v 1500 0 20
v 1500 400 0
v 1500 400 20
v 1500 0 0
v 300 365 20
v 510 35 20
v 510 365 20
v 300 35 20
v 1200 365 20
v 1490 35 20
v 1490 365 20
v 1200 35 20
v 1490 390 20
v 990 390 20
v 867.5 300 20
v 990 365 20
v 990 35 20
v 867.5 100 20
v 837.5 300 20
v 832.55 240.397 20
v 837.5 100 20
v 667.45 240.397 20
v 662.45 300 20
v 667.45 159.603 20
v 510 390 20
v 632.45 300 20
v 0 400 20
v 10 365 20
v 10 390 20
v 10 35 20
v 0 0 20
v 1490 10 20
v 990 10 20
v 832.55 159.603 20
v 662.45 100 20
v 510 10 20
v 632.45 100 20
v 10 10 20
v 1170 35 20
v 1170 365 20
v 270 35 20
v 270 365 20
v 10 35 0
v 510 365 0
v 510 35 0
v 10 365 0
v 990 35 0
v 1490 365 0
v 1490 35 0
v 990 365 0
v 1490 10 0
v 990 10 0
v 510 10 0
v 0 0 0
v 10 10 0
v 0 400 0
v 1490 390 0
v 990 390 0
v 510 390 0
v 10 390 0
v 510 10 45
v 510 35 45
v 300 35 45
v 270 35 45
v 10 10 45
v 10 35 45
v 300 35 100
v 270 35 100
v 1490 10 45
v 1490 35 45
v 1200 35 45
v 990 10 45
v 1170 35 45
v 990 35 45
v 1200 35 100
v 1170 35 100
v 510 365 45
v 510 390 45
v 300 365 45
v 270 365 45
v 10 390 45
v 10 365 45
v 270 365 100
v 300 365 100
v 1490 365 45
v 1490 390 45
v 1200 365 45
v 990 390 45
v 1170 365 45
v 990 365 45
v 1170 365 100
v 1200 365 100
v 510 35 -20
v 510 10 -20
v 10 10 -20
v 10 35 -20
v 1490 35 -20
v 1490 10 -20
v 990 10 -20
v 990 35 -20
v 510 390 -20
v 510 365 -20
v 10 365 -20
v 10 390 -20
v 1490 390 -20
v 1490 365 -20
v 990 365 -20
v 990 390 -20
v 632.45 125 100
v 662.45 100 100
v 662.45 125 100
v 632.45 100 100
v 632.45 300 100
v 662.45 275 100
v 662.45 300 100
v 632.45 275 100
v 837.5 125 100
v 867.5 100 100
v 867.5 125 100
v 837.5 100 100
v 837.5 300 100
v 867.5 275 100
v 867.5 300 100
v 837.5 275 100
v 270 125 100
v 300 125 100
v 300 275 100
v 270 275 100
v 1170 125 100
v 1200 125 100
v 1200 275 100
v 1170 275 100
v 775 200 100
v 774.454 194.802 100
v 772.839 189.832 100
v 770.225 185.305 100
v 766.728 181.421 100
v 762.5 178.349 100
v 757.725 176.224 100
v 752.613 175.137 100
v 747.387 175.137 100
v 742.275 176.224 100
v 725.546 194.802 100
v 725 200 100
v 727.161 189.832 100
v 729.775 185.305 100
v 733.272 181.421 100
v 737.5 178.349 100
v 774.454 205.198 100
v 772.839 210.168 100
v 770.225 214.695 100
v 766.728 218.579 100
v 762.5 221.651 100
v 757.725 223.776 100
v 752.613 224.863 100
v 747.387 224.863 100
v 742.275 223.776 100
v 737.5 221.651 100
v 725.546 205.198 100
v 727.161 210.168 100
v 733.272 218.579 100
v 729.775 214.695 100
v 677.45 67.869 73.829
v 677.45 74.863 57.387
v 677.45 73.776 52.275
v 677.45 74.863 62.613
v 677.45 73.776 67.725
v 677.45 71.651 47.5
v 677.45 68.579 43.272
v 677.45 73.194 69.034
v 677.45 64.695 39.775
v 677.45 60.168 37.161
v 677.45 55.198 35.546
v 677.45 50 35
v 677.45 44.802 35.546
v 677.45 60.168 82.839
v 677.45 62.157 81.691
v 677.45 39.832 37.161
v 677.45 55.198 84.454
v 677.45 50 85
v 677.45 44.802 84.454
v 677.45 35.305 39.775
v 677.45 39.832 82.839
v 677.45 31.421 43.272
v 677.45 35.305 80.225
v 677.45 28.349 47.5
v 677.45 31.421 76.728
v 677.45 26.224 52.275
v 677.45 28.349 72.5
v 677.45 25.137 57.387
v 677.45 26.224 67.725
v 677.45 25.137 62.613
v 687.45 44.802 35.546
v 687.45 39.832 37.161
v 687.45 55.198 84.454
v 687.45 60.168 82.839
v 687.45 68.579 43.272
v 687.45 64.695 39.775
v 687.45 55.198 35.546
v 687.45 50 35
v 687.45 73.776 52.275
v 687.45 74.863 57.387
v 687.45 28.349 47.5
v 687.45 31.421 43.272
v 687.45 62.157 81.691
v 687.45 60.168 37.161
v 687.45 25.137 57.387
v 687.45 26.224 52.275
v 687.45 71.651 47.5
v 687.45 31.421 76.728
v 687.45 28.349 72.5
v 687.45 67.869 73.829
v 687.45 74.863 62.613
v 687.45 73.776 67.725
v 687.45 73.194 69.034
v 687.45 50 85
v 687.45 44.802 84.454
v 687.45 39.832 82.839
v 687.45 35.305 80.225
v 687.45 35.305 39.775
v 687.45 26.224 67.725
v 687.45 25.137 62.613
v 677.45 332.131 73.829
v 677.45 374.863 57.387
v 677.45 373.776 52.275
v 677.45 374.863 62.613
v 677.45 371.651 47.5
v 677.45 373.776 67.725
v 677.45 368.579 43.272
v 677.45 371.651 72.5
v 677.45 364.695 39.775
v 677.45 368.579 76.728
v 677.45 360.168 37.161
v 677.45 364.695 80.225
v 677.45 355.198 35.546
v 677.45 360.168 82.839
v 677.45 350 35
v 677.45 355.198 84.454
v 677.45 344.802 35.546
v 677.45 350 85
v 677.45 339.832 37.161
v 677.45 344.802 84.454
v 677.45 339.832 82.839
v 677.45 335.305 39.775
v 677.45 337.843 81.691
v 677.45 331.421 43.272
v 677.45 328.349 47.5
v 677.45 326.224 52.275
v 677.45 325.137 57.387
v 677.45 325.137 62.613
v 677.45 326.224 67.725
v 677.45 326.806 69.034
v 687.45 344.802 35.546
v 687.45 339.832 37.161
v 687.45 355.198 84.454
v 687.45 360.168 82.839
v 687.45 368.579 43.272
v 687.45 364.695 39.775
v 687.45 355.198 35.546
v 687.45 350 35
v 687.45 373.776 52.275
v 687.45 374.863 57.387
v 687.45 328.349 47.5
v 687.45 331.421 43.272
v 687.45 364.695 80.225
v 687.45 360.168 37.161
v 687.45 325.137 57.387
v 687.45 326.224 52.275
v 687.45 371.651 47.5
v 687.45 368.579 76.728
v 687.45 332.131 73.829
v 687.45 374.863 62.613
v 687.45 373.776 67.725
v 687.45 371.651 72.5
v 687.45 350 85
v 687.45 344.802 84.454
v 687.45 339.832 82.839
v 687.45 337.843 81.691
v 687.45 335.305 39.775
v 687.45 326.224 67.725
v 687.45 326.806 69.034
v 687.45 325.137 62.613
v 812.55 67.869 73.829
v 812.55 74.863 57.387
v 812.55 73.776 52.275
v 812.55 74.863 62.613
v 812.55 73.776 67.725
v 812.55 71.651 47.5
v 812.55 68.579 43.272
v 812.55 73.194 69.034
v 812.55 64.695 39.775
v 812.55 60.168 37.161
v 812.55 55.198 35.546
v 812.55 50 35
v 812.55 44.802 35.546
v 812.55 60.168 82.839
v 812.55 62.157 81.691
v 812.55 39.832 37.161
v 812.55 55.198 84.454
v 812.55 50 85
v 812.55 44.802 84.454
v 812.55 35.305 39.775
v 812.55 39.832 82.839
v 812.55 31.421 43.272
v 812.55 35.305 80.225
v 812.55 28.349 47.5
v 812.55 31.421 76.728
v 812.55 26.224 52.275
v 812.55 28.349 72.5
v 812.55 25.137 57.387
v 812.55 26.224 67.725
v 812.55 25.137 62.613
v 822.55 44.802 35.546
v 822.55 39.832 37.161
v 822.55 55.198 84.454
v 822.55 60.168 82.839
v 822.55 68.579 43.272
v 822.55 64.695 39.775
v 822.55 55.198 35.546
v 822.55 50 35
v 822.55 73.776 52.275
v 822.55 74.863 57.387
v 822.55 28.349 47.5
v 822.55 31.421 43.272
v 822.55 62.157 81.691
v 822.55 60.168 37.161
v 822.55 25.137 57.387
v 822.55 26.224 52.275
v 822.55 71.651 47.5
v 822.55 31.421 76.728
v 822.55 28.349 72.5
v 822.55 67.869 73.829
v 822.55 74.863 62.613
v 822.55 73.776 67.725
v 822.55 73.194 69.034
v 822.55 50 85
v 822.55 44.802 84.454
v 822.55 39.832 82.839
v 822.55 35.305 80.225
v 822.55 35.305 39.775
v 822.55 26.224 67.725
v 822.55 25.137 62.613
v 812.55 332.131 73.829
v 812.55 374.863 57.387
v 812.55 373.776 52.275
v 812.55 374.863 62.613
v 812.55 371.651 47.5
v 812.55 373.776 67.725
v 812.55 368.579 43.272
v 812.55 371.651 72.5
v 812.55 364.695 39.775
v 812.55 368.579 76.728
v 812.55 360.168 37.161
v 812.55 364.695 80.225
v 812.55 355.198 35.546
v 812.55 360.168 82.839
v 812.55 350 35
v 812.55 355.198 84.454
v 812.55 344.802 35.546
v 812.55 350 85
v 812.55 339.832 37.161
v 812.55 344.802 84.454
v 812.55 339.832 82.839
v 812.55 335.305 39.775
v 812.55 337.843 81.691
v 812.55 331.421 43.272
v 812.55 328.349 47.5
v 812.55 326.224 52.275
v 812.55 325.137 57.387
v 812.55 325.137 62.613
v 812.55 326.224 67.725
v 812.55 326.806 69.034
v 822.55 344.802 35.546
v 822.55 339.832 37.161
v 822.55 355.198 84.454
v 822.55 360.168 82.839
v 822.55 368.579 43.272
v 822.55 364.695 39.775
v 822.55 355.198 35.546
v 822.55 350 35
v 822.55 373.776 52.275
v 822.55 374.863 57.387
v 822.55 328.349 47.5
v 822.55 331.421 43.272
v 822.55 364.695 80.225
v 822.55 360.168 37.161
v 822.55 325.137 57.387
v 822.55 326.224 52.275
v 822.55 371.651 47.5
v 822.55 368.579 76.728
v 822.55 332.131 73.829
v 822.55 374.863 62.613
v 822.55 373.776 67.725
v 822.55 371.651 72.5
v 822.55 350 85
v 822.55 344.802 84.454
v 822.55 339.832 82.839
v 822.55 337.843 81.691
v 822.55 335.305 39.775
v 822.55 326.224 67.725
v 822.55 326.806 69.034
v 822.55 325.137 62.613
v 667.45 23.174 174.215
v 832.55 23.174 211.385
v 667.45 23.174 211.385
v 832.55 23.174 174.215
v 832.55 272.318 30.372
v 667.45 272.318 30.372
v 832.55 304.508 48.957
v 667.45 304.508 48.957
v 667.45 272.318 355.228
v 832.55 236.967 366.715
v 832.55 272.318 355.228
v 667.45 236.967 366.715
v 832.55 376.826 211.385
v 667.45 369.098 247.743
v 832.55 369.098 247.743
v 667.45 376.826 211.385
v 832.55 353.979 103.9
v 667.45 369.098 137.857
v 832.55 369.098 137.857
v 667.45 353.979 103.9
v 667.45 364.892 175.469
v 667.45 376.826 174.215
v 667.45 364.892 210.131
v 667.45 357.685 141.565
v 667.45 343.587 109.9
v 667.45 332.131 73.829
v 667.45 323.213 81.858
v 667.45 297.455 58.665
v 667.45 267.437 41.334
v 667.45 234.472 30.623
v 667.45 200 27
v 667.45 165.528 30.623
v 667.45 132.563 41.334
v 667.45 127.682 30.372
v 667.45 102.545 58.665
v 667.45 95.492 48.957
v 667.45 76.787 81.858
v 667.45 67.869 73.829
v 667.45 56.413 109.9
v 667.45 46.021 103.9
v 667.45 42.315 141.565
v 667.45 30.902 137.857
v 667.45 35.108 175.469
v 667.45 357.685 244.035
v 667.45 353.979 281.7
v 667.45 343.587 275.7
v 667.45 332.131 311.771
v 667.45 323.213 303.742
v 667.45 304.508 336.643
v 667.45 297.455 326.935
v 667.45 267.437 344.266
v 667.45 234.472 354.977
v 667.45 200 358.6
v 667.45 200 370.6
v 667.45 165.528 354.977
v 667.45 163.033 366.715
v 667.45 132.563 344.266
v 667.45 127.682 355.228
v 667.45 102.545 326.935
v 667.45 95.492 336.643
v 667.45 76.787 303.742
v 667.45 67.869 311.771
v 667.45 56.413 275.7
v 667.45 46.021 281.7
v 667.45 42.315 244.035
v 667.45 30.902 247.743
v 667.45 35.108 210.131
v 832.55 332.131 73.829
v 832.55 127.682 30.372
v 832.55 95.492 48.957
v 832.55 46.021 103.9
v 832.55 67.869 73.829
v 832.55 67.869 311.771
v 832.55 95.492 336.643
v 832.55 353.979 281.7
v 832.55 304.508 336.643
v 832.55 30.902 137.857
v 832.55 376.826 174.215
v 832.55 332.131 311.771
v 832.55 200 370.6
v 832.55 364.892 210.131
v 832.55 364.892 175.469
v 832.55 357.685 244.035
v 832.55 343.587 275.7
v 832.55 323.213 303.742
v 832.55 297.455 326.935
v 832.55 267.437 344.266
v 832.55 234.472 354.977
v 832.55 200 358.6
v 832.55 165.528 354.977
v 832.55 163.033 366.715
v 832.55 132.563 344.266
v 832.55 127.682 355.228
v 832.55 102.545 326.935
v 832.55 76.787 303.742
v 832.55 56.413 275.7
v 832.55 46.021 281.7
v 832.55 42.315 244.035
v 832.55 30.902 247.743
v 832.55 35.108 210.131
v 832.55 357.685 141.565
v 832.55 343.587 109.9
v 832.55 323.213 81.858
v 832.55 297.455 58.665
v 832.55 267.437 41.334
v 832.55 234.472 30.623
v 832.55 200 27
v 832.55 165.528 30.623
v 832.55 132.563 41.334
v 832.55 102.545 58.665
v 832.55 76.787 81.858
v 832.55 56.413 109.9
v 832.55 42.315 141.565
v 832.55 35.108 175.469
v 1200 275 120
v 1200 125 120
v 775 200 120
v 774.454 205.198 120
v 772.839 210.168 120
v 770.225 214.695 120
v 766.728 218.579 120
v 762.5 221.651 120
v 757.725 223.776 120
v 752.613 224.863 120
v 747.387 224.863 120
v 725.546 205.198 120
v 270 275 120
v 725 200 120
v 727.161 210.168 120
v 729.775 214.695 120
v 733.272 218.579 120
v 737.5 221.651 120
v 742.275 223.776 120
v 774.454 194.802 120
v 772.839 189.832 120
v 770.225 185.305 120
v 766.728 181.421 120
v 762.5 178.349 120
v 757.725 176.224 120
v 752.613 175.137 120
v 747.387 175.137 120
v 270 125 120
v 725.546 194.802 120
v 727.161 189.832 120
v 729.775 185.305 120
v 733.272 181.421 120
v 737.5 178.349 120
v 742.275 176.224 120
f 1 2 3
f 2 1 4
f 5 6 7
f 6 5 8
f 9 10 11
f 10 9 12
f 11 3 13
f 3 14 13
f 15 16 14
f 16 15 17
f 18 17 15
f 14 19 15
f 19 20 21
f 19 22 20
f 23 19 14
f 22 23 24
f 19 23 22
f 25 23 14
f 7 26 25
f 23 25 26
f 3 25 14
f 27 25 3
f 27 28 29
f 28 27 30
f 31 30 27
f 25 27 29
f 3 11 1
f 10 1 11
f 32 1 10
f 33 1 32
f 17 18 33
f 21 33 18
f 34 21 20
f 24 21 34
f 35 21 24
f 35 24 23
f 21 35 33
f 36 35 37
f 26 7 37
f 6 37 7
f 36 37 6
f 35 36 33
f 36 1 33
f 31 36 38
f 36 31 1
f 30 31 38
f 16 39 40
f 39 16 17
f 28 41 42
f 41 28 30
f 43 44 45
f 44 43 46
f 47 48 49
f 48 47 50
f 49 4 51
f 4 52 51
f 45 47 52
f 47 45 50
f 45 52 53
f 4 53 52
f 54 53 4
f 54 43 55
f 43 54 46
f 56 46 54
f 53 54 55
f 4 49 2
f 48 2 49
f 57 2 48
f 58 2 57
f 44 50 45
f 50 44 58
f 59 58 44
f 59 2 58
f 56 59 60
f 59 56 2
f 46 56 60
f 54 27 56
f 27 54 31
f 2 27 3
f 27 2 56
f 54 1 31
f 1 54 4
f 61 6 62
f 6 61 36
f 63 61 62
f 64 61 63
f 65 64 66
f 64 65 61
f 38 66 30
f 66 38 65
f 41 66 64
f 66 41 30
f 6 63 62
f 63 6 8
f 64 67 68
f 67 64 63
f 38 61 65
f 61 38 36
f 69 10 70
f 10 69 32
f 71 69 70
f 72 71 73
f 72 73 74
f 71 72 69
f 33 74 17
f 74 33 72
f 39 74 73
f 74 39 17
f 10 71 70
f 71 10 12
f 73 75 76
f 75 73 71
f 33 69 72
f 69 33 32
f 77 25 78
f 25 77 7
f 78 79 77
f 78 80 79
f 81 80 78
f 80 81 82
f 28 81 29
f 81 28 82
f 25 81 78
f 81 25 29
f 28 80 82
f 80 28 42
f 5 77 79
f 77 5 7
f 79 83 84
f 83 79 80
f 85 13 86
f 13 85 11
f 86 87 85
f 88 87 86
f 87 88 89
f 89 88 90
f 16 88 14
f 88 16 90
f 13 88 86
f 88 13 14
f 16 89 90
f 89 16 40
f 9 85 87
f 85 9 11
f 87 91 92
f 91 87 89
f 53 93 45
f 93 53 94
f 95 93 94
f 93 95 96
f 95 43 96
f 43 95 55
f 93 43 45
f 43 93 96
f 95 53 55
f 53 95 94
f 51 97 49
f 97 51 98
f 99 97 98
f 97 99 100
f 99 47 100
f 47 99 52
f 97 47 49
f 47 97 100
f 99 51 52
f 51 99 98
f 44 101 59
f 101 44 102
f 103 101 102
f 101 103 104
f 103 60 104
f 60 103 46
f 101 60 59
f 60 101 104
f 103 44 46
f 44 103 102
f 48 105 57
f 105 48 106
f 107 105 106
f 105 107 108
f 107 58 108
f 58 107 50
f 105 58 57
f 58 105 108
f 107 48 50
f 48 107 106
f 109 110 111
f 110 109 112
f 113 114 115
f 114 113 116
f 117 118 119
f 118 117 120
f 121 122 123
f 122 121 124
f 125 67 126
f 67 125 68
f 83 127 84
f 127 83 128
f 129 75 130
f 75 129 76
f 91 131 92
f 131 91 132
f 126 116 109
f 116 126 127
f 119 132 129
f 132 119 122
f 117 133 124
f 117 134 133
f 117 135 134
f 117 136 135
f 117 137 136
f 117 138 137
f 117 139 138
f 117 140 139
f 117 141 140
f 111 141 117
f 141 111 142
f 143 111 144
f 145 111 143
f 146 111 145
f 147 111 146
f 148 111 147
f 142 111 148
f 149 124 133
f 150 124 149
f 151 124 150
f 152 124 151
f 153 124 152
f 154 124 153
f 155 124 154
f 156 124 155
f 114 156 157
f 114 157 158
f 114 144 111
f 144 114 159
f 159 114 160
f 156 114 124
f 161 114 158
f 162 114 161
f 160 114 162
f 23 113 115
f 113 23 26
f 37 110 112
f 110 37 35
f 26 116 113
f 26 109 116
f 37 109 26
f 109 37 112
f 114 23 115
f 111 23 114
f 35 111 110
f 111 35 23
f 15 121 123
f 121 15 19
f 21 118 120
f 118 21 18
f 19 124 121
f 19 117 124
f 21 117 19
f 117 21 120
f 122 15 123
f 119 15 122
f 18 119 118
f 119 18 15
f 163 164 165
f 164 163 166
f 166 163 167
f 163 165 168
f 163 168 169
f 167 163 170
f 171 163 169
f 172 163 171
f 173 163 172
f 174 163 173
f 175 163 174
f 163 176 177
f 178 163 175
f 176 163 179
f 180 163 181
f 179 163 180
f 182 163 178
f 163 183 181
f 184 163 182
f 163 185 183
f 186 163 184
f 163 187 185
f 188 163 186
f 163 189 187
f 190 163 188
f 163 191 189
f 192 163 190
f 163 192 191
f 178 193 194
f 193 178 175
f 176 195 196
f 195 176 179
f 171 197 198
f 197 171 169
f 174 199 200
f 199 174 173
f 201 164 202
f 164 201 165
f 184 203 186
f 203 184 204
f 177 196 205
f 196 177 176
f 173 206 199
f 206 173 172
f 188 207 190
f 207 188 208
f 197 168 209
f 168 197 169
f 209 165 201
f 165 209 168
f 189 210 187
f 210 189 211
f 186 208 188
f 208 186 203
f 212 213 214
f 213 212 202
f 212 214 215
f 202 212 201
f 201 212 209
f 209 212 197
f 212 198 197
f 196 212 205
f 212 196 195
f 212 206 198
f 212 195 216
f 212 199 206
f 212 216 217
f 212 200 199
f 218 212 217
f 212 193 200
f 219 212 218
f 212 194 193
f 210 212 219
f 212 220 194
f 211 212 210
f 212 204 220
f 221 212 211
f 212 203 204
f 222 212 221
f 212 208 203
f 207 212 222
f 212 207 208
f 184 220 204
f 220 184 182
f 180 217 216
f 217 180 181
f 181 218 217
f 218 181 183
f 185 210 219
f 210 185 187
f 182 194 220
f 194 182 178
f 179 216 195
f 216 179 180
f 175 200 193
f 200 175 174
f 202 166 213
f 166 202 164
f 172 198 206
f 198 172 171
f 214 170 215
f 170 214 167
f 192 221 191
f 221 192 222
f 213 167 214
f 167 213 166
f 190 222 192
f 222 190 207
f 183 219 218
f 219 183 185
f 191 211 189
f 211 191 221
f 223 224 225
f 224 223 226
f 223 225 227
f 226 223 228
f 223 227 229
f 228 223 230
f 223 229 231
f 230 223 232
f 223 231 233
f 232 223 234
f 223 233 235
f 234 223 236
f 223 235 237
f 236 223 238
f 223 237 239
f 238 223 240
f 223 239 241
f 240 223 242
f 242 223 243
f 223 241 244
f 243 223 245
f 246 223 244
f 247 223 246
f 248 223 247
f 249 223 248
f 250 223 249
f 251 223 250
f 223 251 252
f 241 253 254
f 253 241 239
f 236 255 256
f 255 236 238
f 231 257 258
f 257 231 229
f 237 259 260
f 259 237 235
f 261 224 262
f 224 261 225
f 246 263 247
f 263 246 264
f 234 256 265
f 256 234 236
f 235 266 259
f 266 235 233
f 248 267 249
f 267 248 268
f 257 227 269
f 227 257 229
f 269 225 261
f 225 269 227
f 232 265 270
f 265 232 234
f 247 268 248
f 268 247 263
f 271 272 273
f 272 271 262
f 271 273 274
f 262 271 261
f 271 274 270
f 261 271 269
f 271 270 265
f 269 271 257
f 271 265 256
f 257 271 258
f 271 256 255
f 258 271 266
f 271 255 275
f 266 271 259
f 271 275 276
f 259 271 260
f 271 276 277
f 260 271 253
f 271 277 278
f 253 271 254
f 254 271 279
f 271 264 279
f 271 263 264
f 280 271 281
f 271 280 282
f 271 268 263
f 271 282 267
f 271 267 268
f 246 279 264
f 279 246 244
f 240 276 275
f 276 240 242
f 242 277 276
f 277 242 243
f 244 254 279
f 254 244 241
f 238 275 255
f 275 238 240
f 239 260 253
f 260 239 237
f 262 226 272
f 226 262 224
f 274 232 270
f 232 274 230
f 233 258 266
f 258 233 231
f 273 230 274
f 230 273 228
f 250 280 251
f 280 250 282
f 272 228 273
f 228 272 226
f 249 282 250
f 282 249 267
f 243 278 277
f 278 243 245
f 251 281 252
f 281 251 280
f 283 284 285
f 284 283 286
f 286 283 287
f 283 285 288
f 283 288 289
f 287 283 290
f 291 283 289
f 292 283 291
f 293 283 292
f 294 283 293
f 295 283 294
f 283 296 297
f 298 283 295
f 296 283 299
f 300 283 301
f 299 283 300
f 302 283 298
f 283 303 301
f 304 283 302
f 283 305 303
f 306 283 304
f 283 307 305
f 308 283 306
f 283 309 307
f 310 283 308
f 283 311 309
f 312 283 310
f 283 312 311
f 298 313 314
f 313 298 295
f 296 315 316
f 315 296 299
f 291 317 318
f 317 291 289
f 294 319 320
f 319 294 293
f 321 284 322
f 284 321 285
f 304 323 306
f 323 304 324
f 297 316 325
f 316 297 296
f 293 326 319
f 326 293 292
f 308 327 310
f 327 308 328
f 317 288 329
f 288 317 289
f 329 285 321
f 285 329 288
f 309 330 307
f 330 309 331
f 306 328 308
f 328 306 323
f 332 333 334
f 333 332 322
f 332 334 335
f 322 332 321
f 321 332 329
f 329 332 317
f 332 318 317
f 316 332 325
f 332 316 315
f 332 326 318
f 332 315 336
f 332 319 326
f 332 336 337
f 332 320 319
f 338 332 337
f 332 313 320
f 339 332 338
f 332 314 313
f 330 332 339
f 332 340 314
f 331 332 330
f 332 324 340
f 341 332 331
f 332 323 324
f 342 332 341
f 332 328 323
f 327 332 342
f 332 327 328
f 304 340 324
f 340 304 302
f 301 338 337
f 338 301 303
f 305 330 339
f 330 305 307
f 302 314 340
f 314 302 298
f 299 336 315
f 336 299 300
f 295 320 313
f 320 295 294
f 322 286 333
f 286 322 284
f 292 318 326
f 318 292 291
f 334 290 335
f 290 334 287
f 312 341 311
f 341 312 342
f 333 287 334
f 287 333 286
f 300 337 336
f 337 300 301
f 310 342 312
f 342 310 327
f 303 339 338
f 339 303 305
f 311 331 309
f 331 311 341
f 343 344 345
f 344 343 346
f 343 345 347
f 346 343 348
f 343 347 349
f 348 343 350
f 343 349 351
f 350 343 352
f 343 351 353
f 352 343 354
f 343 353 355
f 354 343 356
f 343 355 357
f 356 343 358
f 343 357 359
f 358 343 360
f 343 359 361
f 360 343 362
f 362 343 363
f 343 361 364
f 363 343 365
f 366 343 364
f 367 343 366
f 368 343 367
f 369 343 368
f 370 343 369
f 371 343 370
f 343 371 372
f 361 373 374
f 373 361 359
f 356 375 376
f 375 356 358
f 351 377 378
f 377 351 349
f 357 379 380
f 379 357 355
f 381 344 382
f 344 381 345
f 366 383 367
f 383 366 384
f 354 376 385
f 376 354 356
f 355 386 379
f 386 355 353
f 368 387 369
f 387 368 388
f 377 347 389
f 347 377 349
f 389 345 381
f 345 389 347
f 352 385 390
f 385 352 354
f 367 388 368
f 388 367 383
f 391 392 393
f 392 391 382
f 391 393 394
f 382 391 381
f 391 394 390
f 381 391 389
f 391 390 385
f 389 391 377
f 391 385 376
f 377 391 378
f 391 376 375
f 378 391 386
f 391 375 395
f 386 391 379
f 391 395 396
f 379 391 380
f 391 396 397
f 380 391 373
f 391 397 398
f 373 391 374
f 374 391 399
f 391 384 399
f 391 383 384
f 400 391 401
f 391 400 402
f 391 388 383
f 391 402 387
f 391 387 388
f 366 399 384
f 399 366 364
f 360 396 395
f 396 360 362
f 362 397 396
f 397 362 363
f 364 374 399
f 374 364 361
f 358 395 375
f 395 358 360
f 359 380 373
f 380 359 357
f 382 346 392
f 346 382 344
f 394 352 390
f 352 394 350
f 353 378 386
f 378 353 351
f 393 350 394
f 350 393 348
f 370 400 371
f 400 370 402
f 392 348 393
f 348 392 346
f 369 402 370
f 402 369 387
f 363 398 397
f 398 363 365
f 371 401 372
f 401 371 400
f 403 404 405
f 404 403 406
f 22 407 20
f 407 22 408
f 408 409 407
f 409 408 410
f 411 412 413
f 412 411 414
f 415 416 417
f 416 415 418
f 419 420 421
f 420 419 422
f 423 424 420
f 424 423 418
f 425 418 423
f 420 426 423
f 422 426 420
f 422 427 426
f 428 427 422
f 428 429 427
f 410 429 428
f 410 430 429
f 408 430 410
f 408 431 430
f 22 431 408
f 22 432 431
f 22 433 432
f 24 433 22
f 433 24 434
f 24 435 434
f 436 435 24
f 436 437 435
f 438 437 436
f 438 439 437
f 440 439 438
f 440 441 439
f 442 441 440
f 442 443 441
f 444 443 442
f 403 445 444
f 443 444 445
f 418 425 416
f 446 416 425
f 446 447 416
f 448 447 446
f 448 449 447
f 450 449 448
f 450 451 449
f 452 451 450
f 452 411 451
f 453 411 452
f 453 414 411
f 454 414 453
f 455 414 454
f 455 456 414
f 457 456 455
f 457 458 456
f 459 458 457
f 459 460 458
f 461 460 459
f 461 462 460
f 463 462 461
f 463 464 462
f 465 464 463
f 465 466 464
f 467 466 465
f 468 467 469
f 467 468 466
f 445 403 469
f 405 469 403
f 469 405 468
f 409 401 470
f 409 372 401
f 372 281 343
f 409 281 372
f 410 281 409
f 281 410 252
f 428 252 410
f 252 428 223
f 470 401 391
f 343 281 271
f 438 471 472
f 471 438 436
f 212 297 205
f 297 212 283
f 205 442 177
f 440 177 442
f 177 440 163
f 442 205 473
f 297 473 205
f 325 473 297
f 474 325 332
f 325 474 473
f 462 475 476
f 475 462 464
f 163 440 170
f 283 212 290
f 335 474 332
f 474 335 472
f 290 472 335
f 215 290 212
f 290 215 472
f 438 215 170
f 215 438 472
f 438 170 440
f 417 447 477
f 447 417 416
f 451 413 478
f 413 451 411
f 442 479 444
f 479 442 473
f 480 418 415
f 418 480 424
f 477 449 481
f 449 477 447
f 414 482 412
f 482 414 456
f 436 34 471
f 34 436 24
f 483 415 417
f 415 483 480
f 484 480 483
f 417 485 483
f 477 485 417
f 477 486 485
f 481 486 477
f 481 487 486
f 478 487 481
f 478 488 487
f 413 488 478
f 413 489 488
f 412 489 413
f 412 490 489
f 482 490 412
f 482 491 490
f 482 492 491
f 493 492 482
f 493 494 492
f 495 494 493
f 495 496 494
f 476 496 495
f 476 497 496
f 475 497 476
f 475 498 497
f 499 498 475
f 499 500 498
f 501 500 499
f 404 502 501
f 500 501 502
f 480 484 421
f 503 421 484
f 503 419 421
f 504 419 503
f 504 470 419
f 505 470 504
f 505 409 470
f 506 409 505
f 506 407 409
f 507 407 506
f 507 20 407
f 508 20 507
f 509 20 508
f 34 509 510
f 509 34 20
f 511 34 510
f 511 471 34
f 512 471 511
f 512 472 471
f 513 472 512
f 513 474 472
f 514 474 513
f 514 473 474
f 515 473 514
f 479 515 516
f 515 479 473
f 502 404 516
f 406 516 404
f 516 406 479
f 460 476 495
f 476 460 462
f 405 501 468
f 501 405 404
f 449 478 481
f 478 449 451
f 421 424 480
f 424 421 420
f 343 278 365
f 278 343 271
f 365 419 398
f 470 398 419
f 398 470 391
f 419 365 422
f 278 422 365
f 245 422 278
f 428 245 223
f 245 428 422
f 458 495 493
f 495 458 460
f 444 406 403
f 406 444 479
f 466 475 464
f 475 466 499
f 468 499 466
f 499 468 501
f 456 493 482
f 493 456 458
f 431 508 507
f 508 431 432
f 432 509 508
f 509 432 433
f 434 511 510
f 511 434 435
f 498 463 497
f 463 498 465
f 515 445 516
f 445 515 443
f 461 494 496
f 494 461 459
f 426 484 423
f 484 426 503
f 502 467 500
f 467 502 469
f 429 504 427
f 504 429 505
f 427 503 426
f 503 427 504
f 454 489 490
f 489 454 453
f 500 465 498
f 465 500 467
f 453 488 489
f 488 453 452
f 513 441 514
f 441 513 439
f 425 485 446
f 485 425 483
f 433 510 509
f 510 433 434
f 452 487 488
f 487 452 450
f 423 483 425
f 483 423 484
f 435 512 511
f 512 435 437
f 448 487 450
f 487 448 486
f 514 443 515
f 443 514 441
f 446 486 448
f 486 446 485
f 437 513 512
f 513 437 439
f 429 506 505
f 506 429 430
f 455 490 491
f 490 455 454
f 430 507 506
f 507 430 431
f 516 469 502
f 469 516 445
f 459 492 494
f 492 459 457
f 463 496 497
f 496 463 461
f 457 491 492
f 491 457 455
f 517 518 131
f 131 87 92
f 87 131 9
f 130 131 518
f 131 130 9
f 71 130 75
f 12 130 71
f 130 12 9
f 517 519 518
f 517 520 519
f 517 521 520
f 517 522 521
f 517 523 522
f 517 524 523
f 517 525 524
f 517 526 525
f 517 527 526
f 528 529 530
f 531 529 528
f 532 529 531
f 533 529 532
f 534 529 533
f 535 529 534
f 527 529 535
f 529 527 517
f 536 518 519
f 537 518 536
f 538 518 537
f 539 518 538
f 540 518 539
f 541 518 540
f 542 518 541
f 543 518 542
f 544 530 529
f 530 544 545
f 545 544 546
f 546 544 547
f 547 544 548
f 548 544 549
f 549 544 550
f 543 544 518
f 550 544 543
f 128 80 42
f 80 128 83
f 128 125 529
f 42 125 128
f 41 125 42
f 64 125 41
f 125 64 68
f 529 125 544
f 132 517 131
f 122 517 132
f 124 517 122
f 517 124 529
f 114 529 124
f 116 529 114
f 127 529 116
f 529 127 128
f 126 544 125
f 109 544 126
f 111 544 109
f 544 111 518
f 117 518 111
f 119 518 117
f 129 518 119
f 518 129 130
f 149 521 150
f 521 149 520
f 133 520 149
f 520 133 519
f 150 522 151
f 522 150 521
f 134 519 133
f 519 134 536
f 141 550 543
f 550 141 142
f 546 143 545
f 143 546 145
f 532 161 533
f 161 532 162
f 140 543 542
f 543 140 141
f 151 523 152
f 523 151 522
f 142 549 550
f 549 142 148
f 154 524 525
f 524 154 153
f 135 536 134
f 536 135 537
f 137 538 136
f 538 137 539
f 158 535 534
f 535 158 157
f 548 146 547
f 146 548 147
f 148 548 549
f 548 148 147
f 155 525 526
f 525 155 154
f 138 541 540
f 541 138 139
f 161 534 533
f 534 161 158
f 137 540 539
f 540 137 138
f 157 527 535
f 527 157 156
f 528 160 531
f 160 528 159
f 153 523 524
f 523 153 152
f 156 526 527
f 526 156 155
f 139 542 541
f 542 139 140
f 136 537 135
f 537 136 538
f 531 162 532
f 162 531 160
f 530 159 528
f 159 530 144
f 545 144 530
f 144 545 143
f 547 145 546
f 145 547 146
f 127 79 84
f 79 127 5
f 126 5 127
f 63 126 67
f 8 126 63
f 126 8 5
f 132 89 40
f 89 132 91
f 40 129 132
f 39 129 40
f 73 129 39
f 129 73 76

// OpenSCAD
module base()
{
  // Base board
  color([1.0, 1.0, 1.0])
    cube([1500, 400, 20]);

  // Runners for router
  translate([10, 10, 20])
    color([1.0, 1.0, 1.0])
    cube([500, 25, 25]);
  translate([990, 10, 20])
    color([1.0, 1.0, 1.0])
    cube([500, 25, 25]);
  translate([10, 365, 20])
    color([1.0, 1.0, 1.0])
    cube([500, 25, 25]);
  translate([990, 365, 20])
    color([1.0, 1.0, 1.0])
    cube([500, 25, 25]);

  // Sockets at the bottom of the board
  translate([10, 10, -20])
    color([1.0, 1.0, 1.0])
    cube([500, 25, 25]);
  translate([990, 10, -20])
    color([1.0, 1.0, 1.0])
    cube([500, 25, 25]);
  translate([10, 365, -20])
    color([1.0, 1.0, 1.0])
    cube([500, 25, 25]);
  translate([990, 365, -20])
    color([1.0, 1.0, 1.0])
    cube([500, 25, 25]);
}

module shell_holder()
{
  // Runners for drum shell
  translate([662.45, 100, 20])
    rotate(90)
    color([0.8, 0.6, 0.4])
    cube([200, 30, 80]);
  translate([867.5, 100, 20])
    rotate(90)
    color([0.8, 0.6, 0.4])
    cube([200, 30, 80]);

  // Wheel 1
  translate([682.45, 50, 60])
    rotate([0, 90, 0])
  cylinder(10, 25, 25, true);

  // Wheel 2
  translate([682.45, 350, 60])
    rotate([0, 90, 0])
  cylinder(10, 25, 25, true);

  // Wheel 3
  translate([817.55, 50, 60])
    rotate([0, 90, 0])
  cylinder(10, 25, 25, true);

  // Wheel 4
  translate([817.55, 350, 60])
    rotate([0, 90, 0])
  cylinder(10, 25, 25, true);
}

module router_mount()
{
  // Runners
  translate([300, 35, 20])
    color([0.8, 0.6, 0.4])
    rotate(90)
    cube([330, 30, 80]);
  translate([1200, 35, 20])
    color([0.8, 0.6, 0.4])
    rotate(90)
    cube([330, 30, 80]);

  // Mount board
  difference() {
    translate([270, 125, 100])
      color([0, 0, 0])
      cube([930, 150, 20]);

    // Hole for cutter head
    translate([750, 200, 110])
      cylinder(40, 25, 25, true);
  }
}

module shell()
{
  // Example drum shell (14"x6.5")
  d = 14 * 2.54 * 10;
  h = 6.5 * 2.54 * 10;

  translate([750, 200, d / 2 + 15])
  rotate([0, 90, 0])
  difference() {
    cylinder(h, d / 2, d / 2, true);
    cylinder(h + 20, d / 2 - 12, d / 2 - 12, true);
  }
}

base();
shell_holder();
shell();
router_mount();
